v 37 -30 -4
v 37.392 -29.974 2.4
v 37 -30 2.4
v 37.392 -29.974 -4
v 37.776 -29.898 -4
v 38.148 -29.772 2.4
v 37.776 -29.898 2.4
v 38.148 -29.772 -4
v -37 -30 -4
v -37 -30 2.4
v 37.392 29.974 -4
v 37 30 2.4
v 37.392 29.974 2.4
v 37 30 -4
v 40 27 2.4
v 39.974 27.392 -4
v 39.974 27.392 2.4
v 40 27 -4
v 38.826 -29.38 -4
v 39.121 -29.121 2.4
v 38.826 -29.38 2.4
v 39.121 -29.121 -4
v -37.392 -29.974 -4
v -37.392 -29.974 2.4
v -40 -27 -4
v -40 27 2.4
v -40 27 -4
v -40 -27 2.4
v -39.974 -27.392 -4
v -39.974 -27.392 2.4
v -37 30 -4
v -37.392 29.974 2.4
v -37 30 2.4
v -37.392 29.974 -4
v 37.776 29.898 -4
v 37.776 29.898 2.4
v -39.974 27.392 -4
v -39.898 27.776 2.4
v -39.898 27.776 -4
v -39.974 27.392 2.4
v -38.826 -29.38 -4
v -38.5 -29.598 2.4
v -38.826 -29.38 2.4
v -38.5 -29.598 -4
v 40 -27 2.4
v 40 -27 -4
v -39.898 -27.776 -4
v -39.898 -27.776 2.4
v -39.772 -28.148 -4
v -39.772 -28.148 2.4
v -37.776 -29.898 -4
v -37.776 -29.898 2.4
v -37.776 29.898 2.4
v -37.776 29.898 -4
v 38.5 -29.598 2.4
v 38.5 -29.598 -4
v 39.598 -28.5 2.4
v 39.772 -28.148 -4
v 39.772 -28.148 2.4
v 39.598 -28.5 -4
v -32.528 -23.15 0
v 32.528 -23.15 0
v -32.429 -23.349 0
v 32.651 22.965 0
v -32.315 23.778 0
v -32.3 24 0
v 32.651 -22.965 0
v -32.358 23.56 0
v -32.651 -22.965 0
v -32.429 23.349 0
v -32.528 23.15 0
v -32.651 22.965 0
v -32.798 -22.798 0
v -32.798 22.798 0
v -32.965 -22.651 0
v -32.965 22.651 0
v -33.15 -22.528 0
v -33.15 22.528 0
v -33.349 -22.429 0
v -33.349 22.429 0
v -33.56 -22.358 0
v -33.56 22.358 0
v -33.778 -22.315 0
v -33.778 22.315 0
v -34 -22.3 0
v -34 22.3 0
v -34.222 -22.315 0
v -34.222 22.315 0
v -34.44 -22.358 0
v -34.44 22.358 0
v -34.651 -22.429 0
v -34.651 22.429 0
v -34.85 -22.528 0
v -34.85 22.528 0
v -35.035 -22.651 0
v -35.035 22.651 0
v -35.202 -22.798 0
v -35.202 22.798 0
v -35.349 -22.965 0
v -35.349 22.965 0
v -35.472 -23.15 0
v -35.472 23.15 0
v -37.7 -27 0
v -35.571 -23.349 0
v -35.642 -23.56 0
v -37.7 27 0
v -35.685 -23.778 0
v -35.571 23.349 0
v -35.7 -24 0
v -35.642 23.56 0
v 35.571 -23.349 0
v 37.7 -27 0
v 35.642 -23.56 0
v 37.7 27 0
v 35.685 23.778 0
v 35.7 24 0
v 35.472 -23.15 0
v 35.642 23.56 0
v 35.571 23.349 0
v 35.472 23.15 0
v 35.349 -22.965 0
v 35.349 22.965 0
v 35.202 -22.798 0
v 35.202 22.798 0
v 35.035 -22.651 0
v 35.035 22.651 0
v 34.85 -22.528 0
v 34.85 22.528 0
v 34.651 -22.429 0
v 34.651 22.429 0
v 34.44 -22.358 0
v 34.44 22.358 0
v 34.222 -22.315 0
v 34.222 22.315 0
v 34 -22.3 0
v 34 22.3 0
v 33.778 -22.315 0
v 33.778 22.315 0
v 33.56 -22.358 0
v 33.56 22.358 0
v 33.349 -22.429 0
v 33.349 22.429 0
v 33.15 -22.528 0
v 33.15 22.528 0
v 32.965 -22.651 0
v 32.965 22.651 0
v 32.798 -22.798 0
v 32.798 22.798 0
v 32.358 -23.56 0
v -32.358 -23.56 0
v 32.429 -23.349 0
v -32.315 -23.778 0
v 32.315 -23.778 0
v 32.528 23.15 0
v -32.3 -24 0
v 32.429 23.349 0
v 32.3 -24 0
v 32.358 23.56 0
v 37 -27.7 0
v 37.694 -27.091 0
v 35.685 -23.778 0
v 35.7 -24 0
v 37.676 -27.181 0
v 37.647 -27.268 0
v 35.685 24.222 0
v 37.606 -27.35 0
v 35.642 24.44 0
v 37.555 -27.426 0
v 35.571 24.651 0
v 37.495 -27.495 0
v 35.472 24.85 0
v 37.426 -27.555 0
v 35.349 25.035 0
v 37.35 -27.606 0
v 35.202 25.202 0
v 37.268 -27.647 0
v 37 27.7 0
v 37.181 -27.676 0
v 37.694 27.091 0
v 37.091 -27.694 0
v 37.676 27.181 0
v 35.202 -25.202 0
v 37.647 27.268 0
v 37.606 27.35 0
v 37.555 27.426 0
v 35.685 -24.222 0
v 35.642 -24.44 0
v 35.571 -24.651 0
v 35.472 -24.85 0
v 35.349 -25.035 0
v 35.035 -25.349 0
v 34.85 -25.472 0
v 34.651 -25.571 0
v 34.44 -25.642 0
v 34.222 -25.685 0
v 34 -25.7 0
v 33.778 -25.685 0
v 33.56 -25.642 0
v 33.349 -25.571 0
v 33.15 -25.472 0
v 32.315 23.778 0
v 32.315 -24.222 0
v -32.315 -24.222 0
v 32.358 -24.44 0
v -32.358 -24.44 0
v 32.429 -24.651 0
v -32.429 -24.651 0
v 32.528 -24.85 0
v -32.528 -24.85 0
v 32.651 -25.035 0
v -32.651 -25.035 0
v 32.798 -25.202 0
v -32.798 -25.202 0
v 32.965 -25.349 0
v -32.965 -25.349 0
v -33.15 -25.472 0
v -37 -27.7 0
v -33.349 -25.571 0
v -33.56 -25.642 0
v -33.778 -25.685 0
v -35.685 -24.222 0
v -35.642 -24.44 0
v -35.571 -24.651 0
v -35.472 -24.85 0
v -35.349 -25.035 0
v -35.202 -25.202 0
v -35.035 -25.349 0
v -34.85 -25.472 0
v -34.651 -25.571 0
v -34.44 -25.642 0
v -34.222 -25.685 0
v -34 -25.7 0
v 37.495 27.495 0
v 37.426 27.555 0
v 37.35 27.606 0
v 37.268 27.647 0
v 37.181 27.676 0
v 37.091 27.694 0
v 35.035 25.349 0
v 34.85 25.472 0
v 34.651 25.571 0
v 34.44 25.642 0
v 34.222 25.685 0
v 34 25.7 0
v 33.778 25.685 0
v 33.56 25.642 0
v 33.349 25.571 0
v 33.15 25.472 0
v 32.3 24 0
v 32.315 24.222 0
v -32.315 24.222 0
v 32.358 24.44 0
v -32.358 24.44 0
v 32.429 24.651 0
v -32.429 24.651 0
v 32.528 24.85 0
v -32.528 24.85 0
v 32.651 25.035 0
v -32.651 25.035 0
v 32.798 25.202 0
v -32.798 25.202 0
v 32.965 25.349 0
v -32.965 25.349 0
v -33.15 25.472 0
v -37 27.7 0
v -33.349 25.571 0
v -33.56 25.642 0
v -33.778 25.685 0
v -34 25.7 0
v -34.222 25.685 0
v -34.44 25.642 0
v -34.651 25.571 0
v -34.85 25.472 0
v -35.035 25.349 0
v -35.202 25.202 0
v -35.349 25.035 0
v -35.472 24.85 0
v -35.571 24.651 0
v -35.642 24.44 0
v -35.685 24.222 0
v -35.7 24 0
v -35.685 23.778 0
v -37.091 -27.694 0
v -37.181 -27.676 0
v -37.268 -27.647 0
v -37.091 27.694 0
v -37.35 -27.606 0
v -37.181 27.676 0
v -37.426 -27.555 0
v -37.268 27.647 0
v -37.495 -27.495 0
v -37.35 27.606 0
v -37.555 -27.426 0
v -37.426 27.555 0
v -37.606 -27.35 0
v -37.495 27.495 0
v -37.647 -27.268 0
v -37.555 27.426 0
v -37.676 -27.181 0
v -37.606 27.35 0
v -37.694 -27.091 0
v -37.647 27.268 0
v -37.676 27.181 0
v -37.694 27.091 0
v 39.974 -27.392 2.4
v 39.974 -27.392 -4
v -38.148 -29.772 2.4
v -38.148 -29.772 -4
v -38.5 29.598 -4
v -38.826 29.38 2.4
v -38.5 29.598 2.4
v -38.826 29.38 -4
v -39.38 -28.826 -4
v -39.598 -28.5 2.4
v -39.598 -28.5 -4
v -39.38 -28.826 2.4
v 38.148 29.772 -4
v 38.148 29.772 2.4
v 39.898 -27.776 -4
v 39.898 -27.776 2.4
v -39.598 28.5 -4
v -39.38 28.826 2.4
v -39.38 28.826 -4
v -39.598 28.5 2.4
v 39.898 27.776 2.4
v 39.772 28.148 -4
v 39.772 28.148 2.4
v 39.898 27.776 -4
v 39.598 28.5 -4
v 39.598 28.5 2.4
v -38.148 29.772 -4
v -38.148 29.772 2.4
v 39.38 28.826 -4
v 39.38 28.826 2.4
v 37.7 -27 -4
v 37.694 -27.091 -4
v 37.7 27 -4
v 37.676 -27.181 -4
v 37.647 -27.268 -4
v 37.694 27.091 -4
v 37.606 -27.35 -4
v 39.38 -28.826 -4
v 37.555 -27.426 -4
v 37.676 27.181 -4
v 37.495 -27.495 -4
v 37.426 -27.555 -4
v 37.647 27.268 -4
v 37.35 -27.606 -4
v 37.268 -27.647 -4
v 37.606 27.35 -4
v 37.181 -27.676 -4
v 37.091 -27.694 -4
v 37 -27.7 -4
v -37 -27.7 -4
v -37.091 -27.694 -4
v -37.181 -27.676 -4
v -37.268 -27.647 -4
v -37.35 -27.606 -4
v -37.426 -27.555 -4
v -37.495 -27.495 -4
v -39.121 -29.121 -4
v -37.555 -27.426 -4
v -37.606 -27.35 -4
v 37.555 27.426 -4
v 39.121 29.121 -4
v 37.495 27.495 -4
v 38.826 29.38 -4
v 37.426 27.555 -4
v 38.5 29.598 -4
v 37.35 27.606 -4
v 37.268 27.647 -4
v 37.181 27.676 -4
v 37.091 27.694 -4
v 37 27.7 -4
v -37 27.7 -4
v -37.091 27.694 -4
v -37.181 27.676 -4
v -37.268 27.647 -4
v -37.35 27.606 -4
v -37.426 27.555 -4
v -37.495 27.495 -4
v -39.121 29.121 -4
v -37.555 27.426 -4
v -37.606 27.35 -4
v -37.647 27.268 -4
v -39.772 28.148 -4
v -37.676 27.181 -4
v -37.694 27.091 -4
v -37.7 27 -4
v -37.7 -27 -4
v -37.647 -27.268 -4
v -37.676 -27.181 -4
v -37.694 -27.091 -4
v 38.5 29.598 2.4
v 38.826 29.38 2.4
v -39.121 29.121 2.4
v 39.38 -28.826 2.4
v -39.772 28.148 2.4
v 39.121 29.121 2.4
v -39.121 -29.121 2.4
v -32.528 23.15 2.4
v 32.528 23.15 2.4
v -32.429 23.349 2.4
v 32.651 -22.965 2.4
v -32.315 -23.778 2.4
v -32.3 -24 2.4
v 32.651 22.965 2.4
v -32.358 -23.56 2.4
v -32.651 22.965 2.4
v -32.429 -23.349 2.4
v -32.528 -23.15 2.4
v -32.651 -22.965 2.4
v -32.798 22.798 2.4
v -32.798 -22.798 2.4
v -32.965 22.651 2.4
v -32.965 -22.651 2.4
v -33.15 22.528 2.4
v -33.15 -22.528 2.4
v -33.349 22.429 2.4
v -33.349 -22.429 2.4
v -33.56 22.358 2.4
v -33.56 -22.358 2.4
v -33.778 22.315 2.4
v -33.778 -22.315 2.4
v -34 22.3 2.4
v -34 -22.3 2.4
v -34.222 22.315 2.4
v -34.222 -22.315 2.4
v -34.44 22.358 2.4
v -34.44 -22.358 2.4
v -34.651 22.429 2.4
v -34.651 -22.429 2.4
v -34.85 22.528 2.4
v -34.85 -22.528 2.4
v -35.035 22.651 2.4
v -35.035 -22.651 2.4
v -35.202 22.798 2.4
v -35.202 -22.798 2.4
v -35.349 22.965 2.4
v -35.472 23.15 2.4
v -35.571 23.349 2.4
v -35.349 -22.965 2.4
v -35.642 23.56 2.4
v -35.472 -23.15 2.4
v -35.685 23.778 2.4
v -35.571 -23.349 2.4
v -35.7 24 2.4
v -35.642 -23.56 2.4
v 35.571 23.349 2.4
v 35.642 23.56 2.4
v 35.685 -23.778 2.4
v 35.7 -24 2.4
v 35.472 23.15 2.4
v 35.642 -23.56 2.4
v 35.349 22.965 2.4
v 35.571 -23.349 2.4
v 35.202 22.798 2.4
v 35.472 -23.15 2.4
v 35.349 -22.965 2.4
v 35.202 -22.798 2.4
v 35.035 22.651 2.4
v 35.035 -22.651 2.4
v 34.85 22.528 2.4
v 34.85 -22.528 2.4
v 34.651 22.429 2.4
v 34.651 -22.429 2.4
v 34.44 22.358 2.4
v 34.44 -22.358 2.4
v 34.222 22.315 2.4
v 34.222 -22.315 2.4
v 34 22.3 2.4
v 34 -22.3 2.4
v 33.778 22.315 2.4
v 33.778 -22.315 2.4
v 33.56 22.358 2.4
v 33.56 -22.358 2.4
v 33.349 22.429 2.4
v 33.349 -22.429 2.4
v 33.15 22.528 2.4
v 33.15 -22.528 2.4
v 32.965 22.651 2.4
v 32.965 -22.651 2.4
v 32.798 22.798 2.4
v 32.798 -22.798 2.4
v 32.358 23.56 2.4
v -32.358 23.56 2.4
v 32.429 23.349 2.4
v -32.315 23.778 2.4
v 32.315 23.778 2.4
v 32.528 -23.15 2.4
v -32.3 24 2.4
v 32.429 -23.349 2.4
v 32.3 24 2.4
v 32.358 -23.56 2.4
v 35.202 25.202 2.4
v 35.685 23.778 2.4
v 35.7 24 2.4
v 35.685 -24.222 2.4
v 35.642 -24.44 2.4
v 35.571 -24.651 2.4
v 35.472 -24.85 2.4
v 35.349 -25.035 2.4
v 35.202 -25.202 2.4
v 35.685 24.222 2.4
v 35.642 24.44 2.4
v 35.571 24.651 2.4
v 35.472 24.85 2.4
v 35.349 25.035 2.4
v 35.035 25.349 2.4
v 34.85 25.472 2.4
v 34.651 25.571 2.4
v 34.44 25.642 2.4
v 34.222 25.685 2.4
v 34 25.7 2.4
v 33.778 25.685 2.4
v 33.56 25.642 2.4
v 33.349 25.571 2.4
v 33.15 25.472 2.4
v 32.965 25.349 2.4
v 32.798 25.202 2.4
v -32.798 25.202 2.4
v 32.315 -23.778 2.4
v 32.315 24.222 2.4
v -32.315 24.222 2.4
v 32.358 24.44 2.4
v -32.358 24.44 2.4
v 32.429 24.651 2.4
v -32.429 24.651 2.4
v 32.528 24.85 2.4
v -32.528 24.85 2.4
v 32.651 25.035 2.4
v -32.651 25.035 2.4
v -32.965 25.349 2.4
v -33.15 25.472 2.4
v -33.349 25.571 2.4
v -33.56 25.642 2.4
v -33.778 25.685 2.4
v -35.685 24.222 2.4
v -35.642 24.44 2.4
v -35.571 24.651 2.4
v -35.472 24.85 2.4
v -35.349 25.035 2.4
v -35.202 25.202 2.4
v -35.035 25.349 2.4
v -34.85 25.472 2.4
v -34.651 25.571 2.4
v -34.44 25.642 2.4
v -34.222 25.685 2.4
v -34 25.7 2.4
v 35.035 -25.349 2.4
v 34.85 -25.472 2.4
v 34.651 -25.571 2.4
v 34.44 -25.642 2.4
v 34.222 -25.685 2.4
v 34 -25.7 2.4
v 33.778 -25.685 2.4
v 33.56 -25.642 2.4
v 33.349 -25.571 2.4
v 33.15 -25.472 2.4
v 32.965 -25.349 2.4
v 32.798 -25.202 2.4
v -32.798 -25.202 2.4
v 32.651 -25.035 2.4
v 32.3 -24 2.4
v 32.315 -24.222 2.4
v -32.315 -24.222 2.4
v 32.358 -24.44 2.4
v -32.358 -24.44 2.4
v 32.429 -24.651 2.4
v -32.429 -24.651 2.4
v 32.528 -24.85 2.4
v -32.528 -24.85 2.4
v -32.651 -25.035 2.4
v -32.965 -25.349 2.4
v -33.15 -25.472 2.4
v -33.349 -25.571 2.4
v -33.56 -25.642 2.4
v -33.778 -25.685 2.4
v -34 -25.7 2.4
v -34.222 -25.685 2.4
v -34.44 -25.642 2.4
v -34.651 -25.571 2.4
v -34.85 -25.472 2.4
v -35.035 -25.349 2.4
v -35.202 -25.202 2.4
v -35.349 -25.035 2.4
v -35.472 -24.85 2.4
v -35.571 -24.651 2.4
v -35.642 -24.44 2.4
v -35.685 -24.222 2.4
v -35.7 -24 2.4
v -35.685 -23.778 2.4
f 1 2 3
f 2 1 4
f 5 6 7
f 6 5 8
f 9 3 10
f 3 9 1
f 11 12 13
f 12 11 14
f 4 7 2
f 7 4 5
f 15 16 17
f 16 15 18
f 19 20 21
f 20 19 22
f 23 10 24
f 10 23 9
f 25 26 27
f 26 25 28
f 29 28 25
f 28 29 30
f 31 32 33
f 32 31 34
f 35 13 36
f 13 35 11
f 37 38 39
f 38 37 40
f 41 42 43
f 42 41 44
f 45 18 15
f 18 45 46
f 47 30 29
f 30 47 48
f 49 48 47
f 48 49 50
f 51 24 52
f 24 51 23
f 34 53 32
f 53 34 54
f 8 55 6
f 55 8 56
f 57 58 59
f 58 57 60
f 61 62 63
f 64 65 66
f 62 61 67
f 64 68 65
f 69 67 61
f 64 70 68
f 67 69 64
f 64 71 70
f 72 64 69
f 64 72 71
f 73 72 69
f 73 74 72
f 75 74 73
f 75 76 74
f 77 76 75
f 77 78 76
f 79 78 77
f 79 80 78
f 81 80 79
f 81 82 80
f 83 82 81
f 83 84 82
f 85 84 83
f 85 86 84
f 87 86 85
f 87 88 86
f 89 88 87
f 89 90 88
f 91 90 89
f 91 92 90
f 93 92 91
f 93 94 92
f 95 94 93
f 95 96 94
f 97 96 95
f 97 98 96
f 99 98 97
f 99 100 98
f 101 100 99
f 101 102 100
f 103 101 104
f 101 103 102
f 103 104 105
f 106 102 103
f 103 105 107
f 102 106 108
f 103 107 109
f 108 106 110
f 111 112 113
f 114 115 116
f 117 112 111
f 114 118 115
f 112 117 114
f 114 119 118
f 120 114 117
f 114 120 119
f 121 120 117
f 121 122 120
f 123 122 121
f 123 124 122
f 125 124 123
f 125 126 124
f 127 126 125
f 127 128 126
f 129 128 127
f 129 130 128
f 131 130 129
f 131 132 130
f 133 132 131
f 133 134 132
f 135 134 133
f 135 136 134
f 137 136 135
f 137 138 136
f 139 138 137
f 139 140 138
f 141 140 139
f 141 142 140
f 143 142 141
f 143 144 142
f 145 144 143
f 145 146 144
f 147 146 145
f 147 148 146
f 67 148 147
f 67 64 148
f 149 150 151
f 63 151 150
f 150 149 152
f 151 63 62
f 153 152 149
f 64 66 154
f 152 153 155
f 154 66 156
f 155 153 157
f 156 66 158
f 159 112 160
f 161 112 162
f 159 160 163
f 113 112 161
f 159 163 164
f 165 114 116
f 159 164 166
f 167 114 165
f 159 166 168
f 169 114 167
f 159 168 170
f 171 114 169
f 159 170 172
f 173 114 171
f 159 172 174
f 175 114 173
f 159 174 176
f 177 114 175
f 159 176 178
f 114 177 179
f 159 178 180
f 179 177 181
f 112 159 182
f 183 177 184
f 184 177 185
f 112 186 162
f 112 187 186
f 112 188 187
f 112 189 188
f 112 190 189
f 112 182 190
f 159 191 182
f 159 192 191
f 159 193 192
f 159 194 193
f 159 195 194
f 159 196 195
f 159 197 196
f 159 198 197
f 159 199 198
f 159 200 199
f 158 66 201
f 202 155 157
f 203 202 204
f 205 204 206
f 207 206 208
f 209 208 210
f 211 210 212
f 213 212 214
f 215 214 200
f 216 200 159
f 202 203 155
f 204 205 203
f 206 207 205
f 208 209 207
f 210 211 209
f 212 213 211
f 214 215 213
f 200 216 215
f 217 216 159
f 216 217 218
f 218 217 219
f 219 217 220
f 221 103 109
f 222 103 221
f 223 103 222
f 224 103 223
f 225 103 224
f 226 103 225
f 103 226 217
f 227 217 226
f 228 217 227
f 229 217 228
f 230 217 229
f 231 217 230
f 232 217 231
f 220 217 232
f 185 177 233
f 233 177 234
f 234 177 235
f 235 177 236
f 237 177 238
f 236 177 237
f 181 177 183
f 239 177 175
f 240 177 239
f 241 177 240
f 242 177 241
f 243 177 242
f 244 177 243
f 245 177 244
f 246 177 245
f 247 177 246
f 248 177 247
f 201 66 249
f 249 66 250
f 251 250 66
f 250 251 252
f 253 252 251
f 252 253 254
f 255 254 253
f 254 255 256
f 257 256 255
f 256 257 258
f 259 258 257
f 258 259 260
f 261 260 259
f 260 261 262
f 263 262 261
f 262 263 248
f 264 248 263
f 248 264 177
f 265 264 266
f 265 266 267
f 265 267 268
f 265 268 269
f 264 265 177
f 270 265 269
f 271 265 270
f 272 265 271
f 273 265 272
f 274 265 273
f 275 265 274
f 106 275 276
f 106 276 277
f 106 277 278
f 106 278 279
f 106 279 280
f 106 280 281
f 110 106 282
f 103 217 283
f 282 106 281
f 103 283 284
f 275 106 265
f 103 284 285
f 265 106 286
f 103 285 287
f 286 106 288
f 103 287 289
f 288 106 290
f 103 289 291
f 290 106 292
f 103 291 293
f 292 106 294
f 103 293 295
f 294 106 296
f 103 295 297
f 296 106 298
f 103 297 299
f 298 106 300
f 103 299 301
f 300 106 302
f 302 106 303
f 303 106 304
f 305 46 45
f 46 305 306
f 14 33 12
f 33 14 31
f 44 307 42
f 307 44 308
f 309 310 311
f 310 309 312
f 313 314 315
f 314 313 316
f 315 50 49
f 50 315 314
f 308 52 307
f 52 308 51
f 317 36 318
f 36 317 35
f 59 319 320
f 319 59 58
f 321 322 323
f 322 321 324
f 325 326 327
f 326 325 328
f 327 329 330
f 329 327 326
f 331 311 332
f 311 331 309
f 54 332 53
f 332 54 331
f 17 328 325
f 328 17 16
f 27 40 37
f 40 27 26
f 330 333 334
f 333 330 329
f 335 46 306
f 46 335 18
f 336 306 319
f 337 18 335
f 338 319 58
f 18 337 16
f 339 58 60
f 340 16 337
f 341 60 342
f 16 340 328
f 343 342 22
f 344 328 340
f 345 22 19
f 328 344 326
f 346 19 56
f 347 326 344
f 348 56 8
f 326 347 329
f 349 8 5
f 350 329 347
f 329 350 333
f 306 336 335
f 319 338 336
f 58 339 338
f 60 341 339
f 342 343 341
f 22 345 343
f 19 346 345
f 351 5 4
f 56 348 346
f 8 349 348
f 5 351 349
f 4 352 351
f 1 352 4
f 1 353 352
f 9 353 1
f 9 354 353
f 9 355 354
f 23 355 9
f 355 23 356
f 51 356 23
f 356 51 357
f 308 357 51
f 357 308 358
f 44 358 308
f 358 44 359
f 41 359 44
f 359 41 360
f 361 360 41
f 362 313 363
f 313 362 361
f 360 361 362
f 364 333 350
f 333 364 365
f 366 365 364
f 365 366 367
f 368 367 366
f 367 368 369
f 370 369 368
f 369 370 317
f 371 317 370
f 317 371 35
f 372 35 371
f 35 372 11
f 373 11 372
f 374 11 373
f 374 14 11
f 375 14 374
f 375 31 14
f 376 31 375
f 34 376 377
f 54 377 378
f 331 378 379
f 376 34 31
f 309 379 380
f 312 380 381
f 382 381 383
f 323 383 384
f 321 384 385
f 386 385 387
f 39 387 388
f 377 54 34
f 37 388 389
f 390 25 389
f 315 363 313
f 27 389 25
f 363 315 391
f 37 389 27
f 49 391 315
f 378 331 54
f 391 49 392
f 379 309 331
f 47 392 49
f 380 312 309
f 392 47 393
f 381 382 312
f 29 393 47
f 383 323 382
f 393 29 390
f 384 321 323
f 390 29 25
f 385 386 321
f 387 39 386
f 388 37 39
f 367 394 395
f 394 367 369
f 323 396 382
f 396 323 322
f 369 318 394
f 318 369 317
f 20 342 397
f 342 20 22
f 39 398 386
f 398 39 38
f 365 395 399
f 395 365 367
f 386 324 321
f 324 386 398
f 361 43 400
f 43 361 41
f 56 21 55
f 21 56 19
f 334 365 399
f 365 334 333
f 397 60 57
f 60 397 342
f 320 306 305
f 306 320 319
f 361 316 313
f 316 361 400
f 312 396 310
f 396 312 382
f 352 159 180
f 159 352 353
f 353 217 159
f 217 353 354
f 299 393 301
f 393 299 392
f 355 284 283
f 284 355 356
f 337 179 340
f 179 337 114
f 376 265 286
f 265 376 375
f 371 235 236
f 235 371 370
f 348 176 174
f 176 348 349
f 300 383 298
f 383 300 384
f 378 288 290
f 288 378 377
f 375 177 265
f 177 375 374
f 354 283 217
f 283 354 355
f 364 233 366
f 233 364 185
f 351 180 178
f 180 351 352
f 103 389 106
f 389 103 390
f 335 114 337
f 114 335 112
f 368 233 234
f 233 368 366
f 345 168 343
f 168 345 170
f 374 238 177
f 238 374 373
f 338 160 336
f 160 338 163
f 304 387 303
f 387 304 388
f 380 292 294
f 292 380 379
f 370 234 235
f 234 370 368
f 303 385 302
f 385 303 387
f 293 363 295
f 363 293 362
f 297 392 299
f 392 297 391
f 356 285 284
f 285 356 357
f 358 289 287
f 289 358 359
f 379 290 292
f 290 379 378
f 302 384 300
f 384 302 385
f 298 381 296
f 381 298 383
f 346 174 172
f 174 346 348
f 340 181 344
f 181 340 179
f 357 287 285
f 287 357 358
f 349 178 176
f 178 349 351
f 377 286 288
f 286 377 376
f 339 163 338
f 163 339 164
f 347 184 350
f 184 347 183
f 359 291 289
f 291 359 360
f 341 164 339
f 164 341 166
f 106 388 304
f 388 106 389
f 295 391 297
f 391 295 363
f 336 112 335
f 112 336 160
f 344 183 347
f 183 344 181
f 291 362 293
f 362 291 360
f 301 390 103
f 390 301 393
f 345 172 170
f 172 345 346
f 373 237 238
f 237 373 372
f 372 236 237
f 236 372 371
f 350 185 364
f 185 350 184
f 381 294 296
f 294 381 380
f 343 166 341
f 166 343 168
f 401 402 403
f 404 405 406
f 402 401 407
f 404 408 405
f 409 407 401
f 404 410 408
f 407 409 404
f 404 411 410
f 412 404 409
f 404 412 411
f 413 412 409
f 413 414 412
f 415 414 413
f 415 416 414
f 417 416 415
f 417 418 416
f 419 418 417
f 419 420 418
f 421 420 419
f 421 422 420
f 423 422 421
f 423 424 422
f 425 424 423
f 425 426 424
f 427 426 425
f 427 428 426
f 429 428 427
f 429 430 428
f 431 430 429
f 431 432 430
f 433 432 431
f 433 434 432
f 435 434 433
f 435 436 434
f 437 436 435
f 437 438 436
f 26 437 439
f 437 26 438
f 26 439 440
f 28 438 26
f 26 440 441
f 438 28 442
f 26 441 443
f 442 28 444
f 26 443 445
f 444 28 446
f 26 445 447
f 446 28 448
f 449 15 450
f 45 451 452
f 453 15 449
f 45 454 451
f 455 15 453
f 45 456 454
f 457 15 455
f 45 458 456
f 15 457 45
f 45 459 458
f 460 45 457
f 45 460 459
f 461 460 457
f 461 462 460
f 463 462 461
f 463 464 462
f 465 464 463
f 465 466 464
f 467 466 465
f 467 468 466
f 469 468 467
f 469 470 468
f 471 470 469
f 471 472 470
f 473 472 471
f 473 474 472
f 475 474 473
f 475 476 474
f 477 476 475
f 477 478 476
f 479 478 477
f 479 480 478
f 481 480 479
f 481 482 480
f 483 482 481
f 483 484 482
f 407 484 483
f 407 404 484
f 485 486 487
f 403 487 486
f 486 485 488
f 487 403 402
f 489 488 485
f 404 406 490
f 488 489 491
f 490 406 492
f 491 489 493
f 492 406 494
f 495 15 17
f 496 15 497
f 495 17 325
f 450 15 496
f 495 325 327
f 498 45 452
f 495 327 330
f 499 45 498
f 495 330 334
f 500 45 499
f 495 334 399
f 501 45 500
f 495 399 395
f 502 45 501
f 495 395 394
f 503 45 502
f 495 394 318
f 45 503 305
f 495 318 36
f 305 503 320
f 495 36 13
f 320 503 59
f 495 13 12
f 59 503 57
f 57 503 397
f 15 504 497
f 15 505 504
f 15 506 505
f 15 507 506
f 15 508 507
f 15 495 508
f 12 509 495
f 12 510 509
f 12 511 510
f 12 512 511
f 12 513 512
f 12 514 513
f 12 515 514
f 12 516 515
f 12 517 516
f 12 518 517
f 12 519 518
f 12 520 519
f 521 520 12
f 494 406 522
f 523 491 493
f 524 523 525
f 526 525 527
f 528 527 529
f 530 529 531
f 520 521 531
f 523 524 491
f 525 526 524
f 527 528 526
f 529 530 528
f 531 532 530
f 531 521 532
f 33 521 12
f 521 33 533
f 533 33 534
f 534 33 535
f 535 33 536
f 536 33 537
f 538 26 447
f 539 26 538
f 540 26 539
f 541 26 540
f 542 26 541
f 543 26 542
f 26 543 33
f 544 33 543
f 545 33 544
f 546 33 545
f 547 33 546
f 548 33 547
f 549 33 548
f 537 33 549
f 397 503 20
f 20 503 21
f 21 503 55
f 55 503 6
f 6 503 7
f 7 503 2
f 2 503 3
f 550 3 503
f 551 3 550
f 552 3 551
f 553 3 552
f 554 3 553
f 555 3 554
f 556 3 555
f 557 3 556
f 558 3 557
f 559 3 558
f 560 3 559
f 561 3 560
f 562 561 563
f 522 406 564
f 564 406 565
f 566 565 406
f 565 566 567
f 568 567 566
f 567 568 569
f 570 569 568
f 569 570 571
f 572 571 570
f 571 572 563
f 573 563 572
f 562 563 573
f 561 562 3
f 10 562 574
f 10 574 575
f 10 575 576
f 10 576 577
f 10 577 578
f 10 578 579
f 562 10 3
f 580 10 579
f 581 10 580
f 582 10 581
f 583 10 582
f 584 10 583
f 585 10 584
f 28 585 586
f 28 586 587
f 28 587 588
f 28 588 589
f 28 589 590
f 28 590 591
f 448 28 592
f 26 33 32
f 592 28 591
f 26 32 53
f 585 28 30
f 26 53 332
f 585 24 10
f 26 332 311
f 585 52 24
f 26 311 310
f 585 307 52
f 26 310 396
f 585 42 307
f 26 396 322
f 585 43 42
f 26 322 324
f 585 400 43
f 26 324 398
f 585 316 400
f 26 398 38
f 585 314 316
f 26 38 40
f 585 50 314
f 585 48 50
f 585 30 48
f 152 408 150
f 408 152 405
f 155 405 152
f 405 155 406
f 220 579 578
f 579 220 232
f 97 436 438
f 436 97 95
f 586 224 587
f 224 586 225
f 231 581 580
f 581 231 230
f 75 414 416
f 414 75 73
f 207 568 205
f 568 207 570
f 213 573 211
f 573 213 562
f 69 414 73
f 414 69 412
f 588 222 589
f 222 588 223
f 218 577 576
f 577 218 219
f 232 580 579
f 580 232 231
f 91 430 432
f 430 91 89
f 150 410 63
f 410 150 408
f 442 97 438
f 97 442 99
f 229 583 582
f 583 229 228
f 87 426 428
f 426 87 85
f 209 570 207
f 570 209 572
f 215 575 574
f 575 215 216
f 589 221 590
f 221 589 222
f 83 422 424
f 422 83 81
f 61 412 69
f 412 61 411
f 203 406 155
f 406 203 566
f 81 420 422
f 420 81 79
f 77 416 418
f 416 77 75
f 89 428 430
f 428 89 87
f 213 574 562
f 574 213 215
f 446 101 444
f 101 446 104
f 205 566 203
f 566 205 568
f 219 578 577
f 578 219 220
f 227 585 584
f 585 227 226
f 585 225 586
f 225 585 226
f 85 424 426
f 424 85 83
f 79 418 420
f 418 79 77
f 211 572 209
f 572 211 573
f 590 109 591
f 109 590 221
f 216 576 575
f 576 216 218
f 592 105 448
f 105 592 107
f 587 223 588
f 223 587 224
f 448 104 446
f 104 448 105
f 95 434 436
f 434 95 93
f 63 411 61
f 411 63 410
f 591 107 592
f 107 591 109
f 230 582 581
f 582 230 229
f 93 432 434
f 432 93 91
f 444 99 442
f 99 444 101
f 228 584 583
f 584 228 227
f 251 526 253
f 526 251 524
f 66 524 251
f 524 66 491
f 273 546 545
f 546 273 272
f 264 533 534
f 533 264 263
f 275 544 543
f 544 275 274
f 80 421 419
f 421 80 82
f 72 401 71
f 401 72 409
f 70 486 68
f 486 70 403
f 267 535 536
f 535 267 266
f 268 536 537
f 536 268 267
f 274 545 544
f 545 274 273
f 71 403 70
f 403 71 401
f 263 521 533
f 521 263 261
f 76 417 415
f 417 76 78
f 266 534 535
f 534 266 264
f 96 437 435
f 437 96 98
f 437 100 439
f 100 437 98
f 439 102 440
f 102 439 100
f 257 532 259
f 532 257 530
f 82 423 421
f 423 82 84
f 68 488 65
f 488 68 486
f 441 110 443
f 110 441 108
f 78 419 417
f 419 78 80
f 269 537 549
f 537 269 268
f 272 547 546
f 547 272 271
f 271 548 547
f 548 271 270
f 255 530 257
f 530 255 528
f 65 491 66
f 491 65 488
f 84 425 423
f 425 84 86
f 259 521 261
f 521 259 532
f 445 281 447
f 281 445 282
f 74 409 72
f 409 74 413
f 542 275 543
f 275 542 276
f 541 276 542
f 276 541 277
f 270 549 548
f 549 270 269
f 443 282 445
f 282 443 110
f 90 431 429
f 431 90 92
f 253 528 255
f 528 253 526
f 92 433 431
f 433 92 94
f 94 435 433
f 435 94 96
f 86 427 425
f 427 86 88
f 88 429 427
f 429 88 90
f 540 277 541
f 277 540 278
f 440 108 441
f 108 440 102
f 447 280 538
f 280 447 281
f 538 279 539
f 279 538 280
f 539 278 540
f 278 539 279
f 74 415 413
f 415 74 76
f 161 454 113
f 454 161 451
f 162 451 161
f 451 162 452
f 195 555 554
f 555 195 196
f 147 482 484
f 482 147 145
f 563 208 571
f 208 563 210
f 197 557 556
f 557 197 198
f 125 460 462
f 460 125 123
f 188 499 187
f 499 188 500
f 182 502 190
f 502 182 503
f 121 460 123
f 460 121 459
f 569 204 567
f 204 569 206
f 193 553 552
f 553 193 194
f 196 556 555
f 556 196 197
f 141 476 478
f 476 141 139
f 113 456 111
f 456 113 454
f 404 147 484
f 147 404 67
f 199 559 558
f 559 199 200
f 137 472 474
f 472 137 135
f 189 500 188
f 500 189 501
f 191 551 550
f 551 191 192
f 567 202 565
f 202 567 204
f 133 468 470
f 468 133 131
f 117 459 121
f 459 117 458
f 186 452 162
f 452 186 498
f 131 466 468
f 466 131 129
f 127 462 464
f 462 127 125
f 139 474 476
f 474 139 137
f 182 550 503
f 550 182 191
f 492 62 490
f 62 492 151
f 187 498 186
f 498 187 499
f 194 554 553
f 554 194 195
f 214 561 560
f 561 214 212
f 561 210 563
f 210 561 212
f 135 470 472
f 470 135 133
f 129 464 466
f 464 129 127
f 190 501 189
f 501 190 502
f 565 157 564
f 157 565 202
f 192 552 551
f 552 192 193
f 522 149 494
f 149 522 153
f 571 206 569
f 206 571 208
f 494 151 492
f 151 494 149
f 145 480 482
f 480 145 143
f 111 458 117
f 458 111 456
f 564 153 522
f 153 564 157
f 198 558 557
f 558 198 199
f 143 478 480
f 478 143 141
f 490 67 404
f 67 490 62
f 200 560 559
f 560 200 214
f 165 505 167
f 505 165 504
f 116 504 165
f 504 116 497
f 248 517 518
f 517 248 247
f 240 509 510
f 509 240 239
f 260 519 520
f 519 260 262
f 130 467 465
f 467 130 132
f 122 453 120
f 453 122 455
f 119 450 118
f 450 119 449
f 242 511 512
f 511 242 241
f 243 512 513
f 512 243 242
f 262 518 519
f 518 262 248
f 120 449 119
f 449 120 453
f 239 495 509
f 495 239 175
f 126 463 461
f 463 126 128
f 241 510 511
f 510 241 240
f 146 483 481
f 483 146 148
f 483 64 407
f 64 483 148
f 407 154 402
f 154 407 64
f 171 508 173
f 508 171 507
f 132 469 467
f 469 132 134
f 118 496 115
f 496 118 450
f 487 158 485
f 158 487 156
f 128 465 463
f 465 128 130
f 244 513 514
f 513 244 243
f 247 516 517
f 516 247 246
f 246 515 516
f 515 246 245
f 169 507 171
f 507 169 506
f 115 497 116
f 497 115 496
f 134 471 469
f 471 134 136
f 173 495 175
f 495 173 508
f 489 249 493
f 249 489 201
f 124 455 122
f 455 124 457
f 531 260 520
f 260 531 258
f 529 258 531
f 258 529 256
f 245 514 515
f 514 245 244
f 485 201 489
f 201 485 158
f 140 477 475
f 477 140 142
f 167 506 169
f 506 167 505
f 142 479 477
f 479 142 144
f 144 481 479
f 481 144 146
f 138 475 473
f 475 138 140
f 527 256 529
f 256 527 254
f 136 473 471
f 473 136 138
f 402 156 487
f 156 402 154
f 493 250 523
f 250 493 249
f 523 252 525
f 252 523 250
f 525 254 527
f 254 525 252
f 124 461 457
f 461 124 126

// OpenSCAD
// file: ../lib/fdm.scad
// Shared FDM-friendly helpers for OpensCAD parts.
// Include from parts with: include <../lib/fdm.scad>;

// Default mesh density when a caller does not pass fragments=.
default_fragments = 48;
// Tiny overshoot used only inside helper boolean cleanup (not a part dimension).
helper_epsilon    = 0.01;

// Rounded rectangle extruded along Z (2D fillet → manifold solid).
module rounded_rect(size, radius, center = true) {
    w = size[0];
    h = size[1];
    r = min(radius, min(w, h) / 2);
    offset(r = r)
        offset(delta = -r)
            square([w, h], center = center);
}

module rounded_box(size, radius, center = true) {
    linear_extrude(height = size[2], center = center)
        rounded_rect([size[0], size[1]], radius, center = true);
}

// Cylinder with optional countersink (flat-head screw seat).
module countersunk_hole(d, h, cs_d = undef, cs_h = undef, center = false, fragments = undef) {
    fn = is_undef(fragments) ? default_fragments : fragments;
    cd = is_undef(cs_d) ? d * 2 : cs_d;
    ch = is_undef(cs_h) ? (cd - d) / 2 : cs_h;
    union() {
        cylinder(d = d, h = h, center = center, $fn = fn);
        translate([0, 0, center ? h / 2 - ch : h - ch])
            cylinder(d1 = d, d2 = cd, h = ch, center = false, $fn = fn);
    }
}

// Simple through-hole.
module mounting_hole(d, h, center = false, fragments = undef) {
    fn = is_undef(fragments) ? default_fragments : fragments;
    cylinder(d = d, h = h, center = center, $fn = fn);
}

// Fillet along +Z edge of a cube corner (positive volume).
// Prefer 2D offset fillets on extruded profiles for reliable manifolds.
module cylinder_fillet(r, h, fragments = undef) {
    fn = is_undef(fragments) ? default_fragments : fragments;
    eps = helper_epsilon;
    difference() {
        translate([-eps, -eps, 0])
            cube([r + eps, r + eps, h]);
        translate([r, r, -eps])
            cylinder(r = r, h = h + 2 * eps, $fn = fn);
    }
}
// main file
// Simple rectangular enclosure lid with a lip and four corner screw holes.
// Customizer: Window → Customizer, tweak groups below, F5 to preview.

include <../lib/fdm.scad>;

/* [Size] */
outer_x  = 80.0;  // mm — lid outer X
outer_y  = 60.0;  // mm — lid outer Y
lid_top  = 2.4;   // mm — top plate thickness (~3× nozzle)
lip_h    = 4.0;   // mm — downward lip height
lip_wall = 2.0;   // mm — lip wall thickness
fit_gap  = 0.3;   // mm — clearance so lip slips over box walls

/* [Mount] */
fillet          = 3.0;  // mm — outer corner radius
screw_d         = 3.4;  // mm — M3 clearance
hole_inset      = 6.0;  // mm — hole center inset from outer edges
inner_fillet_min = 0.1; // mm — floor for inner lip fillet after wall/gap

/* [Print] */
nozzle       = 0.4;  // mm — informational
fragments    = 48;   // [24:8:128] circle / arc resolution ($fn)
bool_epsilon = 0.2;  // mm — through-cut overshoot

/* [Hidden] */
inner_x      = outer_x - 2 * (lip_wall + fit_gap);
inner_y      = outer_y - 2 * (lip_wall + fit_gap);
inner_fillet = max(inner_fillet_min, fillet - lip_wall - fit_gap);
$fn          = fragments;

module enclosure_lid() {
    difference() {
        union() {
            translate([0, 0, lid_top / 2])
                rounded_box([outer_x, outer_y, lid_top], fillet, center = true);

            translate([0, 0, -lip_h / 2])
                difference() {
                    rounded_box([outer_x, outer_y, lip_h], fillet, center = true);
                    rounded_box(
                        [inner_x, inner_y, lip_h + bool_epsilon],
                        inner_fillet,
                        center = true
                    );
                }
        }

        for (sx = [-1, 1], sy = [-1, 1]) {
            translate([
                sx * (outer_x / 2 - hole_inset),
                sy * (outer_y / 2 - hole_inset),
                -bool_epsilon / 2
            ])
                mounting_hole(
                    screw_d,
                    lid_top + lip_h + bool_epsilon,
                    fragments = fragments
                );
        }
    }
}

enclosure_lid();
